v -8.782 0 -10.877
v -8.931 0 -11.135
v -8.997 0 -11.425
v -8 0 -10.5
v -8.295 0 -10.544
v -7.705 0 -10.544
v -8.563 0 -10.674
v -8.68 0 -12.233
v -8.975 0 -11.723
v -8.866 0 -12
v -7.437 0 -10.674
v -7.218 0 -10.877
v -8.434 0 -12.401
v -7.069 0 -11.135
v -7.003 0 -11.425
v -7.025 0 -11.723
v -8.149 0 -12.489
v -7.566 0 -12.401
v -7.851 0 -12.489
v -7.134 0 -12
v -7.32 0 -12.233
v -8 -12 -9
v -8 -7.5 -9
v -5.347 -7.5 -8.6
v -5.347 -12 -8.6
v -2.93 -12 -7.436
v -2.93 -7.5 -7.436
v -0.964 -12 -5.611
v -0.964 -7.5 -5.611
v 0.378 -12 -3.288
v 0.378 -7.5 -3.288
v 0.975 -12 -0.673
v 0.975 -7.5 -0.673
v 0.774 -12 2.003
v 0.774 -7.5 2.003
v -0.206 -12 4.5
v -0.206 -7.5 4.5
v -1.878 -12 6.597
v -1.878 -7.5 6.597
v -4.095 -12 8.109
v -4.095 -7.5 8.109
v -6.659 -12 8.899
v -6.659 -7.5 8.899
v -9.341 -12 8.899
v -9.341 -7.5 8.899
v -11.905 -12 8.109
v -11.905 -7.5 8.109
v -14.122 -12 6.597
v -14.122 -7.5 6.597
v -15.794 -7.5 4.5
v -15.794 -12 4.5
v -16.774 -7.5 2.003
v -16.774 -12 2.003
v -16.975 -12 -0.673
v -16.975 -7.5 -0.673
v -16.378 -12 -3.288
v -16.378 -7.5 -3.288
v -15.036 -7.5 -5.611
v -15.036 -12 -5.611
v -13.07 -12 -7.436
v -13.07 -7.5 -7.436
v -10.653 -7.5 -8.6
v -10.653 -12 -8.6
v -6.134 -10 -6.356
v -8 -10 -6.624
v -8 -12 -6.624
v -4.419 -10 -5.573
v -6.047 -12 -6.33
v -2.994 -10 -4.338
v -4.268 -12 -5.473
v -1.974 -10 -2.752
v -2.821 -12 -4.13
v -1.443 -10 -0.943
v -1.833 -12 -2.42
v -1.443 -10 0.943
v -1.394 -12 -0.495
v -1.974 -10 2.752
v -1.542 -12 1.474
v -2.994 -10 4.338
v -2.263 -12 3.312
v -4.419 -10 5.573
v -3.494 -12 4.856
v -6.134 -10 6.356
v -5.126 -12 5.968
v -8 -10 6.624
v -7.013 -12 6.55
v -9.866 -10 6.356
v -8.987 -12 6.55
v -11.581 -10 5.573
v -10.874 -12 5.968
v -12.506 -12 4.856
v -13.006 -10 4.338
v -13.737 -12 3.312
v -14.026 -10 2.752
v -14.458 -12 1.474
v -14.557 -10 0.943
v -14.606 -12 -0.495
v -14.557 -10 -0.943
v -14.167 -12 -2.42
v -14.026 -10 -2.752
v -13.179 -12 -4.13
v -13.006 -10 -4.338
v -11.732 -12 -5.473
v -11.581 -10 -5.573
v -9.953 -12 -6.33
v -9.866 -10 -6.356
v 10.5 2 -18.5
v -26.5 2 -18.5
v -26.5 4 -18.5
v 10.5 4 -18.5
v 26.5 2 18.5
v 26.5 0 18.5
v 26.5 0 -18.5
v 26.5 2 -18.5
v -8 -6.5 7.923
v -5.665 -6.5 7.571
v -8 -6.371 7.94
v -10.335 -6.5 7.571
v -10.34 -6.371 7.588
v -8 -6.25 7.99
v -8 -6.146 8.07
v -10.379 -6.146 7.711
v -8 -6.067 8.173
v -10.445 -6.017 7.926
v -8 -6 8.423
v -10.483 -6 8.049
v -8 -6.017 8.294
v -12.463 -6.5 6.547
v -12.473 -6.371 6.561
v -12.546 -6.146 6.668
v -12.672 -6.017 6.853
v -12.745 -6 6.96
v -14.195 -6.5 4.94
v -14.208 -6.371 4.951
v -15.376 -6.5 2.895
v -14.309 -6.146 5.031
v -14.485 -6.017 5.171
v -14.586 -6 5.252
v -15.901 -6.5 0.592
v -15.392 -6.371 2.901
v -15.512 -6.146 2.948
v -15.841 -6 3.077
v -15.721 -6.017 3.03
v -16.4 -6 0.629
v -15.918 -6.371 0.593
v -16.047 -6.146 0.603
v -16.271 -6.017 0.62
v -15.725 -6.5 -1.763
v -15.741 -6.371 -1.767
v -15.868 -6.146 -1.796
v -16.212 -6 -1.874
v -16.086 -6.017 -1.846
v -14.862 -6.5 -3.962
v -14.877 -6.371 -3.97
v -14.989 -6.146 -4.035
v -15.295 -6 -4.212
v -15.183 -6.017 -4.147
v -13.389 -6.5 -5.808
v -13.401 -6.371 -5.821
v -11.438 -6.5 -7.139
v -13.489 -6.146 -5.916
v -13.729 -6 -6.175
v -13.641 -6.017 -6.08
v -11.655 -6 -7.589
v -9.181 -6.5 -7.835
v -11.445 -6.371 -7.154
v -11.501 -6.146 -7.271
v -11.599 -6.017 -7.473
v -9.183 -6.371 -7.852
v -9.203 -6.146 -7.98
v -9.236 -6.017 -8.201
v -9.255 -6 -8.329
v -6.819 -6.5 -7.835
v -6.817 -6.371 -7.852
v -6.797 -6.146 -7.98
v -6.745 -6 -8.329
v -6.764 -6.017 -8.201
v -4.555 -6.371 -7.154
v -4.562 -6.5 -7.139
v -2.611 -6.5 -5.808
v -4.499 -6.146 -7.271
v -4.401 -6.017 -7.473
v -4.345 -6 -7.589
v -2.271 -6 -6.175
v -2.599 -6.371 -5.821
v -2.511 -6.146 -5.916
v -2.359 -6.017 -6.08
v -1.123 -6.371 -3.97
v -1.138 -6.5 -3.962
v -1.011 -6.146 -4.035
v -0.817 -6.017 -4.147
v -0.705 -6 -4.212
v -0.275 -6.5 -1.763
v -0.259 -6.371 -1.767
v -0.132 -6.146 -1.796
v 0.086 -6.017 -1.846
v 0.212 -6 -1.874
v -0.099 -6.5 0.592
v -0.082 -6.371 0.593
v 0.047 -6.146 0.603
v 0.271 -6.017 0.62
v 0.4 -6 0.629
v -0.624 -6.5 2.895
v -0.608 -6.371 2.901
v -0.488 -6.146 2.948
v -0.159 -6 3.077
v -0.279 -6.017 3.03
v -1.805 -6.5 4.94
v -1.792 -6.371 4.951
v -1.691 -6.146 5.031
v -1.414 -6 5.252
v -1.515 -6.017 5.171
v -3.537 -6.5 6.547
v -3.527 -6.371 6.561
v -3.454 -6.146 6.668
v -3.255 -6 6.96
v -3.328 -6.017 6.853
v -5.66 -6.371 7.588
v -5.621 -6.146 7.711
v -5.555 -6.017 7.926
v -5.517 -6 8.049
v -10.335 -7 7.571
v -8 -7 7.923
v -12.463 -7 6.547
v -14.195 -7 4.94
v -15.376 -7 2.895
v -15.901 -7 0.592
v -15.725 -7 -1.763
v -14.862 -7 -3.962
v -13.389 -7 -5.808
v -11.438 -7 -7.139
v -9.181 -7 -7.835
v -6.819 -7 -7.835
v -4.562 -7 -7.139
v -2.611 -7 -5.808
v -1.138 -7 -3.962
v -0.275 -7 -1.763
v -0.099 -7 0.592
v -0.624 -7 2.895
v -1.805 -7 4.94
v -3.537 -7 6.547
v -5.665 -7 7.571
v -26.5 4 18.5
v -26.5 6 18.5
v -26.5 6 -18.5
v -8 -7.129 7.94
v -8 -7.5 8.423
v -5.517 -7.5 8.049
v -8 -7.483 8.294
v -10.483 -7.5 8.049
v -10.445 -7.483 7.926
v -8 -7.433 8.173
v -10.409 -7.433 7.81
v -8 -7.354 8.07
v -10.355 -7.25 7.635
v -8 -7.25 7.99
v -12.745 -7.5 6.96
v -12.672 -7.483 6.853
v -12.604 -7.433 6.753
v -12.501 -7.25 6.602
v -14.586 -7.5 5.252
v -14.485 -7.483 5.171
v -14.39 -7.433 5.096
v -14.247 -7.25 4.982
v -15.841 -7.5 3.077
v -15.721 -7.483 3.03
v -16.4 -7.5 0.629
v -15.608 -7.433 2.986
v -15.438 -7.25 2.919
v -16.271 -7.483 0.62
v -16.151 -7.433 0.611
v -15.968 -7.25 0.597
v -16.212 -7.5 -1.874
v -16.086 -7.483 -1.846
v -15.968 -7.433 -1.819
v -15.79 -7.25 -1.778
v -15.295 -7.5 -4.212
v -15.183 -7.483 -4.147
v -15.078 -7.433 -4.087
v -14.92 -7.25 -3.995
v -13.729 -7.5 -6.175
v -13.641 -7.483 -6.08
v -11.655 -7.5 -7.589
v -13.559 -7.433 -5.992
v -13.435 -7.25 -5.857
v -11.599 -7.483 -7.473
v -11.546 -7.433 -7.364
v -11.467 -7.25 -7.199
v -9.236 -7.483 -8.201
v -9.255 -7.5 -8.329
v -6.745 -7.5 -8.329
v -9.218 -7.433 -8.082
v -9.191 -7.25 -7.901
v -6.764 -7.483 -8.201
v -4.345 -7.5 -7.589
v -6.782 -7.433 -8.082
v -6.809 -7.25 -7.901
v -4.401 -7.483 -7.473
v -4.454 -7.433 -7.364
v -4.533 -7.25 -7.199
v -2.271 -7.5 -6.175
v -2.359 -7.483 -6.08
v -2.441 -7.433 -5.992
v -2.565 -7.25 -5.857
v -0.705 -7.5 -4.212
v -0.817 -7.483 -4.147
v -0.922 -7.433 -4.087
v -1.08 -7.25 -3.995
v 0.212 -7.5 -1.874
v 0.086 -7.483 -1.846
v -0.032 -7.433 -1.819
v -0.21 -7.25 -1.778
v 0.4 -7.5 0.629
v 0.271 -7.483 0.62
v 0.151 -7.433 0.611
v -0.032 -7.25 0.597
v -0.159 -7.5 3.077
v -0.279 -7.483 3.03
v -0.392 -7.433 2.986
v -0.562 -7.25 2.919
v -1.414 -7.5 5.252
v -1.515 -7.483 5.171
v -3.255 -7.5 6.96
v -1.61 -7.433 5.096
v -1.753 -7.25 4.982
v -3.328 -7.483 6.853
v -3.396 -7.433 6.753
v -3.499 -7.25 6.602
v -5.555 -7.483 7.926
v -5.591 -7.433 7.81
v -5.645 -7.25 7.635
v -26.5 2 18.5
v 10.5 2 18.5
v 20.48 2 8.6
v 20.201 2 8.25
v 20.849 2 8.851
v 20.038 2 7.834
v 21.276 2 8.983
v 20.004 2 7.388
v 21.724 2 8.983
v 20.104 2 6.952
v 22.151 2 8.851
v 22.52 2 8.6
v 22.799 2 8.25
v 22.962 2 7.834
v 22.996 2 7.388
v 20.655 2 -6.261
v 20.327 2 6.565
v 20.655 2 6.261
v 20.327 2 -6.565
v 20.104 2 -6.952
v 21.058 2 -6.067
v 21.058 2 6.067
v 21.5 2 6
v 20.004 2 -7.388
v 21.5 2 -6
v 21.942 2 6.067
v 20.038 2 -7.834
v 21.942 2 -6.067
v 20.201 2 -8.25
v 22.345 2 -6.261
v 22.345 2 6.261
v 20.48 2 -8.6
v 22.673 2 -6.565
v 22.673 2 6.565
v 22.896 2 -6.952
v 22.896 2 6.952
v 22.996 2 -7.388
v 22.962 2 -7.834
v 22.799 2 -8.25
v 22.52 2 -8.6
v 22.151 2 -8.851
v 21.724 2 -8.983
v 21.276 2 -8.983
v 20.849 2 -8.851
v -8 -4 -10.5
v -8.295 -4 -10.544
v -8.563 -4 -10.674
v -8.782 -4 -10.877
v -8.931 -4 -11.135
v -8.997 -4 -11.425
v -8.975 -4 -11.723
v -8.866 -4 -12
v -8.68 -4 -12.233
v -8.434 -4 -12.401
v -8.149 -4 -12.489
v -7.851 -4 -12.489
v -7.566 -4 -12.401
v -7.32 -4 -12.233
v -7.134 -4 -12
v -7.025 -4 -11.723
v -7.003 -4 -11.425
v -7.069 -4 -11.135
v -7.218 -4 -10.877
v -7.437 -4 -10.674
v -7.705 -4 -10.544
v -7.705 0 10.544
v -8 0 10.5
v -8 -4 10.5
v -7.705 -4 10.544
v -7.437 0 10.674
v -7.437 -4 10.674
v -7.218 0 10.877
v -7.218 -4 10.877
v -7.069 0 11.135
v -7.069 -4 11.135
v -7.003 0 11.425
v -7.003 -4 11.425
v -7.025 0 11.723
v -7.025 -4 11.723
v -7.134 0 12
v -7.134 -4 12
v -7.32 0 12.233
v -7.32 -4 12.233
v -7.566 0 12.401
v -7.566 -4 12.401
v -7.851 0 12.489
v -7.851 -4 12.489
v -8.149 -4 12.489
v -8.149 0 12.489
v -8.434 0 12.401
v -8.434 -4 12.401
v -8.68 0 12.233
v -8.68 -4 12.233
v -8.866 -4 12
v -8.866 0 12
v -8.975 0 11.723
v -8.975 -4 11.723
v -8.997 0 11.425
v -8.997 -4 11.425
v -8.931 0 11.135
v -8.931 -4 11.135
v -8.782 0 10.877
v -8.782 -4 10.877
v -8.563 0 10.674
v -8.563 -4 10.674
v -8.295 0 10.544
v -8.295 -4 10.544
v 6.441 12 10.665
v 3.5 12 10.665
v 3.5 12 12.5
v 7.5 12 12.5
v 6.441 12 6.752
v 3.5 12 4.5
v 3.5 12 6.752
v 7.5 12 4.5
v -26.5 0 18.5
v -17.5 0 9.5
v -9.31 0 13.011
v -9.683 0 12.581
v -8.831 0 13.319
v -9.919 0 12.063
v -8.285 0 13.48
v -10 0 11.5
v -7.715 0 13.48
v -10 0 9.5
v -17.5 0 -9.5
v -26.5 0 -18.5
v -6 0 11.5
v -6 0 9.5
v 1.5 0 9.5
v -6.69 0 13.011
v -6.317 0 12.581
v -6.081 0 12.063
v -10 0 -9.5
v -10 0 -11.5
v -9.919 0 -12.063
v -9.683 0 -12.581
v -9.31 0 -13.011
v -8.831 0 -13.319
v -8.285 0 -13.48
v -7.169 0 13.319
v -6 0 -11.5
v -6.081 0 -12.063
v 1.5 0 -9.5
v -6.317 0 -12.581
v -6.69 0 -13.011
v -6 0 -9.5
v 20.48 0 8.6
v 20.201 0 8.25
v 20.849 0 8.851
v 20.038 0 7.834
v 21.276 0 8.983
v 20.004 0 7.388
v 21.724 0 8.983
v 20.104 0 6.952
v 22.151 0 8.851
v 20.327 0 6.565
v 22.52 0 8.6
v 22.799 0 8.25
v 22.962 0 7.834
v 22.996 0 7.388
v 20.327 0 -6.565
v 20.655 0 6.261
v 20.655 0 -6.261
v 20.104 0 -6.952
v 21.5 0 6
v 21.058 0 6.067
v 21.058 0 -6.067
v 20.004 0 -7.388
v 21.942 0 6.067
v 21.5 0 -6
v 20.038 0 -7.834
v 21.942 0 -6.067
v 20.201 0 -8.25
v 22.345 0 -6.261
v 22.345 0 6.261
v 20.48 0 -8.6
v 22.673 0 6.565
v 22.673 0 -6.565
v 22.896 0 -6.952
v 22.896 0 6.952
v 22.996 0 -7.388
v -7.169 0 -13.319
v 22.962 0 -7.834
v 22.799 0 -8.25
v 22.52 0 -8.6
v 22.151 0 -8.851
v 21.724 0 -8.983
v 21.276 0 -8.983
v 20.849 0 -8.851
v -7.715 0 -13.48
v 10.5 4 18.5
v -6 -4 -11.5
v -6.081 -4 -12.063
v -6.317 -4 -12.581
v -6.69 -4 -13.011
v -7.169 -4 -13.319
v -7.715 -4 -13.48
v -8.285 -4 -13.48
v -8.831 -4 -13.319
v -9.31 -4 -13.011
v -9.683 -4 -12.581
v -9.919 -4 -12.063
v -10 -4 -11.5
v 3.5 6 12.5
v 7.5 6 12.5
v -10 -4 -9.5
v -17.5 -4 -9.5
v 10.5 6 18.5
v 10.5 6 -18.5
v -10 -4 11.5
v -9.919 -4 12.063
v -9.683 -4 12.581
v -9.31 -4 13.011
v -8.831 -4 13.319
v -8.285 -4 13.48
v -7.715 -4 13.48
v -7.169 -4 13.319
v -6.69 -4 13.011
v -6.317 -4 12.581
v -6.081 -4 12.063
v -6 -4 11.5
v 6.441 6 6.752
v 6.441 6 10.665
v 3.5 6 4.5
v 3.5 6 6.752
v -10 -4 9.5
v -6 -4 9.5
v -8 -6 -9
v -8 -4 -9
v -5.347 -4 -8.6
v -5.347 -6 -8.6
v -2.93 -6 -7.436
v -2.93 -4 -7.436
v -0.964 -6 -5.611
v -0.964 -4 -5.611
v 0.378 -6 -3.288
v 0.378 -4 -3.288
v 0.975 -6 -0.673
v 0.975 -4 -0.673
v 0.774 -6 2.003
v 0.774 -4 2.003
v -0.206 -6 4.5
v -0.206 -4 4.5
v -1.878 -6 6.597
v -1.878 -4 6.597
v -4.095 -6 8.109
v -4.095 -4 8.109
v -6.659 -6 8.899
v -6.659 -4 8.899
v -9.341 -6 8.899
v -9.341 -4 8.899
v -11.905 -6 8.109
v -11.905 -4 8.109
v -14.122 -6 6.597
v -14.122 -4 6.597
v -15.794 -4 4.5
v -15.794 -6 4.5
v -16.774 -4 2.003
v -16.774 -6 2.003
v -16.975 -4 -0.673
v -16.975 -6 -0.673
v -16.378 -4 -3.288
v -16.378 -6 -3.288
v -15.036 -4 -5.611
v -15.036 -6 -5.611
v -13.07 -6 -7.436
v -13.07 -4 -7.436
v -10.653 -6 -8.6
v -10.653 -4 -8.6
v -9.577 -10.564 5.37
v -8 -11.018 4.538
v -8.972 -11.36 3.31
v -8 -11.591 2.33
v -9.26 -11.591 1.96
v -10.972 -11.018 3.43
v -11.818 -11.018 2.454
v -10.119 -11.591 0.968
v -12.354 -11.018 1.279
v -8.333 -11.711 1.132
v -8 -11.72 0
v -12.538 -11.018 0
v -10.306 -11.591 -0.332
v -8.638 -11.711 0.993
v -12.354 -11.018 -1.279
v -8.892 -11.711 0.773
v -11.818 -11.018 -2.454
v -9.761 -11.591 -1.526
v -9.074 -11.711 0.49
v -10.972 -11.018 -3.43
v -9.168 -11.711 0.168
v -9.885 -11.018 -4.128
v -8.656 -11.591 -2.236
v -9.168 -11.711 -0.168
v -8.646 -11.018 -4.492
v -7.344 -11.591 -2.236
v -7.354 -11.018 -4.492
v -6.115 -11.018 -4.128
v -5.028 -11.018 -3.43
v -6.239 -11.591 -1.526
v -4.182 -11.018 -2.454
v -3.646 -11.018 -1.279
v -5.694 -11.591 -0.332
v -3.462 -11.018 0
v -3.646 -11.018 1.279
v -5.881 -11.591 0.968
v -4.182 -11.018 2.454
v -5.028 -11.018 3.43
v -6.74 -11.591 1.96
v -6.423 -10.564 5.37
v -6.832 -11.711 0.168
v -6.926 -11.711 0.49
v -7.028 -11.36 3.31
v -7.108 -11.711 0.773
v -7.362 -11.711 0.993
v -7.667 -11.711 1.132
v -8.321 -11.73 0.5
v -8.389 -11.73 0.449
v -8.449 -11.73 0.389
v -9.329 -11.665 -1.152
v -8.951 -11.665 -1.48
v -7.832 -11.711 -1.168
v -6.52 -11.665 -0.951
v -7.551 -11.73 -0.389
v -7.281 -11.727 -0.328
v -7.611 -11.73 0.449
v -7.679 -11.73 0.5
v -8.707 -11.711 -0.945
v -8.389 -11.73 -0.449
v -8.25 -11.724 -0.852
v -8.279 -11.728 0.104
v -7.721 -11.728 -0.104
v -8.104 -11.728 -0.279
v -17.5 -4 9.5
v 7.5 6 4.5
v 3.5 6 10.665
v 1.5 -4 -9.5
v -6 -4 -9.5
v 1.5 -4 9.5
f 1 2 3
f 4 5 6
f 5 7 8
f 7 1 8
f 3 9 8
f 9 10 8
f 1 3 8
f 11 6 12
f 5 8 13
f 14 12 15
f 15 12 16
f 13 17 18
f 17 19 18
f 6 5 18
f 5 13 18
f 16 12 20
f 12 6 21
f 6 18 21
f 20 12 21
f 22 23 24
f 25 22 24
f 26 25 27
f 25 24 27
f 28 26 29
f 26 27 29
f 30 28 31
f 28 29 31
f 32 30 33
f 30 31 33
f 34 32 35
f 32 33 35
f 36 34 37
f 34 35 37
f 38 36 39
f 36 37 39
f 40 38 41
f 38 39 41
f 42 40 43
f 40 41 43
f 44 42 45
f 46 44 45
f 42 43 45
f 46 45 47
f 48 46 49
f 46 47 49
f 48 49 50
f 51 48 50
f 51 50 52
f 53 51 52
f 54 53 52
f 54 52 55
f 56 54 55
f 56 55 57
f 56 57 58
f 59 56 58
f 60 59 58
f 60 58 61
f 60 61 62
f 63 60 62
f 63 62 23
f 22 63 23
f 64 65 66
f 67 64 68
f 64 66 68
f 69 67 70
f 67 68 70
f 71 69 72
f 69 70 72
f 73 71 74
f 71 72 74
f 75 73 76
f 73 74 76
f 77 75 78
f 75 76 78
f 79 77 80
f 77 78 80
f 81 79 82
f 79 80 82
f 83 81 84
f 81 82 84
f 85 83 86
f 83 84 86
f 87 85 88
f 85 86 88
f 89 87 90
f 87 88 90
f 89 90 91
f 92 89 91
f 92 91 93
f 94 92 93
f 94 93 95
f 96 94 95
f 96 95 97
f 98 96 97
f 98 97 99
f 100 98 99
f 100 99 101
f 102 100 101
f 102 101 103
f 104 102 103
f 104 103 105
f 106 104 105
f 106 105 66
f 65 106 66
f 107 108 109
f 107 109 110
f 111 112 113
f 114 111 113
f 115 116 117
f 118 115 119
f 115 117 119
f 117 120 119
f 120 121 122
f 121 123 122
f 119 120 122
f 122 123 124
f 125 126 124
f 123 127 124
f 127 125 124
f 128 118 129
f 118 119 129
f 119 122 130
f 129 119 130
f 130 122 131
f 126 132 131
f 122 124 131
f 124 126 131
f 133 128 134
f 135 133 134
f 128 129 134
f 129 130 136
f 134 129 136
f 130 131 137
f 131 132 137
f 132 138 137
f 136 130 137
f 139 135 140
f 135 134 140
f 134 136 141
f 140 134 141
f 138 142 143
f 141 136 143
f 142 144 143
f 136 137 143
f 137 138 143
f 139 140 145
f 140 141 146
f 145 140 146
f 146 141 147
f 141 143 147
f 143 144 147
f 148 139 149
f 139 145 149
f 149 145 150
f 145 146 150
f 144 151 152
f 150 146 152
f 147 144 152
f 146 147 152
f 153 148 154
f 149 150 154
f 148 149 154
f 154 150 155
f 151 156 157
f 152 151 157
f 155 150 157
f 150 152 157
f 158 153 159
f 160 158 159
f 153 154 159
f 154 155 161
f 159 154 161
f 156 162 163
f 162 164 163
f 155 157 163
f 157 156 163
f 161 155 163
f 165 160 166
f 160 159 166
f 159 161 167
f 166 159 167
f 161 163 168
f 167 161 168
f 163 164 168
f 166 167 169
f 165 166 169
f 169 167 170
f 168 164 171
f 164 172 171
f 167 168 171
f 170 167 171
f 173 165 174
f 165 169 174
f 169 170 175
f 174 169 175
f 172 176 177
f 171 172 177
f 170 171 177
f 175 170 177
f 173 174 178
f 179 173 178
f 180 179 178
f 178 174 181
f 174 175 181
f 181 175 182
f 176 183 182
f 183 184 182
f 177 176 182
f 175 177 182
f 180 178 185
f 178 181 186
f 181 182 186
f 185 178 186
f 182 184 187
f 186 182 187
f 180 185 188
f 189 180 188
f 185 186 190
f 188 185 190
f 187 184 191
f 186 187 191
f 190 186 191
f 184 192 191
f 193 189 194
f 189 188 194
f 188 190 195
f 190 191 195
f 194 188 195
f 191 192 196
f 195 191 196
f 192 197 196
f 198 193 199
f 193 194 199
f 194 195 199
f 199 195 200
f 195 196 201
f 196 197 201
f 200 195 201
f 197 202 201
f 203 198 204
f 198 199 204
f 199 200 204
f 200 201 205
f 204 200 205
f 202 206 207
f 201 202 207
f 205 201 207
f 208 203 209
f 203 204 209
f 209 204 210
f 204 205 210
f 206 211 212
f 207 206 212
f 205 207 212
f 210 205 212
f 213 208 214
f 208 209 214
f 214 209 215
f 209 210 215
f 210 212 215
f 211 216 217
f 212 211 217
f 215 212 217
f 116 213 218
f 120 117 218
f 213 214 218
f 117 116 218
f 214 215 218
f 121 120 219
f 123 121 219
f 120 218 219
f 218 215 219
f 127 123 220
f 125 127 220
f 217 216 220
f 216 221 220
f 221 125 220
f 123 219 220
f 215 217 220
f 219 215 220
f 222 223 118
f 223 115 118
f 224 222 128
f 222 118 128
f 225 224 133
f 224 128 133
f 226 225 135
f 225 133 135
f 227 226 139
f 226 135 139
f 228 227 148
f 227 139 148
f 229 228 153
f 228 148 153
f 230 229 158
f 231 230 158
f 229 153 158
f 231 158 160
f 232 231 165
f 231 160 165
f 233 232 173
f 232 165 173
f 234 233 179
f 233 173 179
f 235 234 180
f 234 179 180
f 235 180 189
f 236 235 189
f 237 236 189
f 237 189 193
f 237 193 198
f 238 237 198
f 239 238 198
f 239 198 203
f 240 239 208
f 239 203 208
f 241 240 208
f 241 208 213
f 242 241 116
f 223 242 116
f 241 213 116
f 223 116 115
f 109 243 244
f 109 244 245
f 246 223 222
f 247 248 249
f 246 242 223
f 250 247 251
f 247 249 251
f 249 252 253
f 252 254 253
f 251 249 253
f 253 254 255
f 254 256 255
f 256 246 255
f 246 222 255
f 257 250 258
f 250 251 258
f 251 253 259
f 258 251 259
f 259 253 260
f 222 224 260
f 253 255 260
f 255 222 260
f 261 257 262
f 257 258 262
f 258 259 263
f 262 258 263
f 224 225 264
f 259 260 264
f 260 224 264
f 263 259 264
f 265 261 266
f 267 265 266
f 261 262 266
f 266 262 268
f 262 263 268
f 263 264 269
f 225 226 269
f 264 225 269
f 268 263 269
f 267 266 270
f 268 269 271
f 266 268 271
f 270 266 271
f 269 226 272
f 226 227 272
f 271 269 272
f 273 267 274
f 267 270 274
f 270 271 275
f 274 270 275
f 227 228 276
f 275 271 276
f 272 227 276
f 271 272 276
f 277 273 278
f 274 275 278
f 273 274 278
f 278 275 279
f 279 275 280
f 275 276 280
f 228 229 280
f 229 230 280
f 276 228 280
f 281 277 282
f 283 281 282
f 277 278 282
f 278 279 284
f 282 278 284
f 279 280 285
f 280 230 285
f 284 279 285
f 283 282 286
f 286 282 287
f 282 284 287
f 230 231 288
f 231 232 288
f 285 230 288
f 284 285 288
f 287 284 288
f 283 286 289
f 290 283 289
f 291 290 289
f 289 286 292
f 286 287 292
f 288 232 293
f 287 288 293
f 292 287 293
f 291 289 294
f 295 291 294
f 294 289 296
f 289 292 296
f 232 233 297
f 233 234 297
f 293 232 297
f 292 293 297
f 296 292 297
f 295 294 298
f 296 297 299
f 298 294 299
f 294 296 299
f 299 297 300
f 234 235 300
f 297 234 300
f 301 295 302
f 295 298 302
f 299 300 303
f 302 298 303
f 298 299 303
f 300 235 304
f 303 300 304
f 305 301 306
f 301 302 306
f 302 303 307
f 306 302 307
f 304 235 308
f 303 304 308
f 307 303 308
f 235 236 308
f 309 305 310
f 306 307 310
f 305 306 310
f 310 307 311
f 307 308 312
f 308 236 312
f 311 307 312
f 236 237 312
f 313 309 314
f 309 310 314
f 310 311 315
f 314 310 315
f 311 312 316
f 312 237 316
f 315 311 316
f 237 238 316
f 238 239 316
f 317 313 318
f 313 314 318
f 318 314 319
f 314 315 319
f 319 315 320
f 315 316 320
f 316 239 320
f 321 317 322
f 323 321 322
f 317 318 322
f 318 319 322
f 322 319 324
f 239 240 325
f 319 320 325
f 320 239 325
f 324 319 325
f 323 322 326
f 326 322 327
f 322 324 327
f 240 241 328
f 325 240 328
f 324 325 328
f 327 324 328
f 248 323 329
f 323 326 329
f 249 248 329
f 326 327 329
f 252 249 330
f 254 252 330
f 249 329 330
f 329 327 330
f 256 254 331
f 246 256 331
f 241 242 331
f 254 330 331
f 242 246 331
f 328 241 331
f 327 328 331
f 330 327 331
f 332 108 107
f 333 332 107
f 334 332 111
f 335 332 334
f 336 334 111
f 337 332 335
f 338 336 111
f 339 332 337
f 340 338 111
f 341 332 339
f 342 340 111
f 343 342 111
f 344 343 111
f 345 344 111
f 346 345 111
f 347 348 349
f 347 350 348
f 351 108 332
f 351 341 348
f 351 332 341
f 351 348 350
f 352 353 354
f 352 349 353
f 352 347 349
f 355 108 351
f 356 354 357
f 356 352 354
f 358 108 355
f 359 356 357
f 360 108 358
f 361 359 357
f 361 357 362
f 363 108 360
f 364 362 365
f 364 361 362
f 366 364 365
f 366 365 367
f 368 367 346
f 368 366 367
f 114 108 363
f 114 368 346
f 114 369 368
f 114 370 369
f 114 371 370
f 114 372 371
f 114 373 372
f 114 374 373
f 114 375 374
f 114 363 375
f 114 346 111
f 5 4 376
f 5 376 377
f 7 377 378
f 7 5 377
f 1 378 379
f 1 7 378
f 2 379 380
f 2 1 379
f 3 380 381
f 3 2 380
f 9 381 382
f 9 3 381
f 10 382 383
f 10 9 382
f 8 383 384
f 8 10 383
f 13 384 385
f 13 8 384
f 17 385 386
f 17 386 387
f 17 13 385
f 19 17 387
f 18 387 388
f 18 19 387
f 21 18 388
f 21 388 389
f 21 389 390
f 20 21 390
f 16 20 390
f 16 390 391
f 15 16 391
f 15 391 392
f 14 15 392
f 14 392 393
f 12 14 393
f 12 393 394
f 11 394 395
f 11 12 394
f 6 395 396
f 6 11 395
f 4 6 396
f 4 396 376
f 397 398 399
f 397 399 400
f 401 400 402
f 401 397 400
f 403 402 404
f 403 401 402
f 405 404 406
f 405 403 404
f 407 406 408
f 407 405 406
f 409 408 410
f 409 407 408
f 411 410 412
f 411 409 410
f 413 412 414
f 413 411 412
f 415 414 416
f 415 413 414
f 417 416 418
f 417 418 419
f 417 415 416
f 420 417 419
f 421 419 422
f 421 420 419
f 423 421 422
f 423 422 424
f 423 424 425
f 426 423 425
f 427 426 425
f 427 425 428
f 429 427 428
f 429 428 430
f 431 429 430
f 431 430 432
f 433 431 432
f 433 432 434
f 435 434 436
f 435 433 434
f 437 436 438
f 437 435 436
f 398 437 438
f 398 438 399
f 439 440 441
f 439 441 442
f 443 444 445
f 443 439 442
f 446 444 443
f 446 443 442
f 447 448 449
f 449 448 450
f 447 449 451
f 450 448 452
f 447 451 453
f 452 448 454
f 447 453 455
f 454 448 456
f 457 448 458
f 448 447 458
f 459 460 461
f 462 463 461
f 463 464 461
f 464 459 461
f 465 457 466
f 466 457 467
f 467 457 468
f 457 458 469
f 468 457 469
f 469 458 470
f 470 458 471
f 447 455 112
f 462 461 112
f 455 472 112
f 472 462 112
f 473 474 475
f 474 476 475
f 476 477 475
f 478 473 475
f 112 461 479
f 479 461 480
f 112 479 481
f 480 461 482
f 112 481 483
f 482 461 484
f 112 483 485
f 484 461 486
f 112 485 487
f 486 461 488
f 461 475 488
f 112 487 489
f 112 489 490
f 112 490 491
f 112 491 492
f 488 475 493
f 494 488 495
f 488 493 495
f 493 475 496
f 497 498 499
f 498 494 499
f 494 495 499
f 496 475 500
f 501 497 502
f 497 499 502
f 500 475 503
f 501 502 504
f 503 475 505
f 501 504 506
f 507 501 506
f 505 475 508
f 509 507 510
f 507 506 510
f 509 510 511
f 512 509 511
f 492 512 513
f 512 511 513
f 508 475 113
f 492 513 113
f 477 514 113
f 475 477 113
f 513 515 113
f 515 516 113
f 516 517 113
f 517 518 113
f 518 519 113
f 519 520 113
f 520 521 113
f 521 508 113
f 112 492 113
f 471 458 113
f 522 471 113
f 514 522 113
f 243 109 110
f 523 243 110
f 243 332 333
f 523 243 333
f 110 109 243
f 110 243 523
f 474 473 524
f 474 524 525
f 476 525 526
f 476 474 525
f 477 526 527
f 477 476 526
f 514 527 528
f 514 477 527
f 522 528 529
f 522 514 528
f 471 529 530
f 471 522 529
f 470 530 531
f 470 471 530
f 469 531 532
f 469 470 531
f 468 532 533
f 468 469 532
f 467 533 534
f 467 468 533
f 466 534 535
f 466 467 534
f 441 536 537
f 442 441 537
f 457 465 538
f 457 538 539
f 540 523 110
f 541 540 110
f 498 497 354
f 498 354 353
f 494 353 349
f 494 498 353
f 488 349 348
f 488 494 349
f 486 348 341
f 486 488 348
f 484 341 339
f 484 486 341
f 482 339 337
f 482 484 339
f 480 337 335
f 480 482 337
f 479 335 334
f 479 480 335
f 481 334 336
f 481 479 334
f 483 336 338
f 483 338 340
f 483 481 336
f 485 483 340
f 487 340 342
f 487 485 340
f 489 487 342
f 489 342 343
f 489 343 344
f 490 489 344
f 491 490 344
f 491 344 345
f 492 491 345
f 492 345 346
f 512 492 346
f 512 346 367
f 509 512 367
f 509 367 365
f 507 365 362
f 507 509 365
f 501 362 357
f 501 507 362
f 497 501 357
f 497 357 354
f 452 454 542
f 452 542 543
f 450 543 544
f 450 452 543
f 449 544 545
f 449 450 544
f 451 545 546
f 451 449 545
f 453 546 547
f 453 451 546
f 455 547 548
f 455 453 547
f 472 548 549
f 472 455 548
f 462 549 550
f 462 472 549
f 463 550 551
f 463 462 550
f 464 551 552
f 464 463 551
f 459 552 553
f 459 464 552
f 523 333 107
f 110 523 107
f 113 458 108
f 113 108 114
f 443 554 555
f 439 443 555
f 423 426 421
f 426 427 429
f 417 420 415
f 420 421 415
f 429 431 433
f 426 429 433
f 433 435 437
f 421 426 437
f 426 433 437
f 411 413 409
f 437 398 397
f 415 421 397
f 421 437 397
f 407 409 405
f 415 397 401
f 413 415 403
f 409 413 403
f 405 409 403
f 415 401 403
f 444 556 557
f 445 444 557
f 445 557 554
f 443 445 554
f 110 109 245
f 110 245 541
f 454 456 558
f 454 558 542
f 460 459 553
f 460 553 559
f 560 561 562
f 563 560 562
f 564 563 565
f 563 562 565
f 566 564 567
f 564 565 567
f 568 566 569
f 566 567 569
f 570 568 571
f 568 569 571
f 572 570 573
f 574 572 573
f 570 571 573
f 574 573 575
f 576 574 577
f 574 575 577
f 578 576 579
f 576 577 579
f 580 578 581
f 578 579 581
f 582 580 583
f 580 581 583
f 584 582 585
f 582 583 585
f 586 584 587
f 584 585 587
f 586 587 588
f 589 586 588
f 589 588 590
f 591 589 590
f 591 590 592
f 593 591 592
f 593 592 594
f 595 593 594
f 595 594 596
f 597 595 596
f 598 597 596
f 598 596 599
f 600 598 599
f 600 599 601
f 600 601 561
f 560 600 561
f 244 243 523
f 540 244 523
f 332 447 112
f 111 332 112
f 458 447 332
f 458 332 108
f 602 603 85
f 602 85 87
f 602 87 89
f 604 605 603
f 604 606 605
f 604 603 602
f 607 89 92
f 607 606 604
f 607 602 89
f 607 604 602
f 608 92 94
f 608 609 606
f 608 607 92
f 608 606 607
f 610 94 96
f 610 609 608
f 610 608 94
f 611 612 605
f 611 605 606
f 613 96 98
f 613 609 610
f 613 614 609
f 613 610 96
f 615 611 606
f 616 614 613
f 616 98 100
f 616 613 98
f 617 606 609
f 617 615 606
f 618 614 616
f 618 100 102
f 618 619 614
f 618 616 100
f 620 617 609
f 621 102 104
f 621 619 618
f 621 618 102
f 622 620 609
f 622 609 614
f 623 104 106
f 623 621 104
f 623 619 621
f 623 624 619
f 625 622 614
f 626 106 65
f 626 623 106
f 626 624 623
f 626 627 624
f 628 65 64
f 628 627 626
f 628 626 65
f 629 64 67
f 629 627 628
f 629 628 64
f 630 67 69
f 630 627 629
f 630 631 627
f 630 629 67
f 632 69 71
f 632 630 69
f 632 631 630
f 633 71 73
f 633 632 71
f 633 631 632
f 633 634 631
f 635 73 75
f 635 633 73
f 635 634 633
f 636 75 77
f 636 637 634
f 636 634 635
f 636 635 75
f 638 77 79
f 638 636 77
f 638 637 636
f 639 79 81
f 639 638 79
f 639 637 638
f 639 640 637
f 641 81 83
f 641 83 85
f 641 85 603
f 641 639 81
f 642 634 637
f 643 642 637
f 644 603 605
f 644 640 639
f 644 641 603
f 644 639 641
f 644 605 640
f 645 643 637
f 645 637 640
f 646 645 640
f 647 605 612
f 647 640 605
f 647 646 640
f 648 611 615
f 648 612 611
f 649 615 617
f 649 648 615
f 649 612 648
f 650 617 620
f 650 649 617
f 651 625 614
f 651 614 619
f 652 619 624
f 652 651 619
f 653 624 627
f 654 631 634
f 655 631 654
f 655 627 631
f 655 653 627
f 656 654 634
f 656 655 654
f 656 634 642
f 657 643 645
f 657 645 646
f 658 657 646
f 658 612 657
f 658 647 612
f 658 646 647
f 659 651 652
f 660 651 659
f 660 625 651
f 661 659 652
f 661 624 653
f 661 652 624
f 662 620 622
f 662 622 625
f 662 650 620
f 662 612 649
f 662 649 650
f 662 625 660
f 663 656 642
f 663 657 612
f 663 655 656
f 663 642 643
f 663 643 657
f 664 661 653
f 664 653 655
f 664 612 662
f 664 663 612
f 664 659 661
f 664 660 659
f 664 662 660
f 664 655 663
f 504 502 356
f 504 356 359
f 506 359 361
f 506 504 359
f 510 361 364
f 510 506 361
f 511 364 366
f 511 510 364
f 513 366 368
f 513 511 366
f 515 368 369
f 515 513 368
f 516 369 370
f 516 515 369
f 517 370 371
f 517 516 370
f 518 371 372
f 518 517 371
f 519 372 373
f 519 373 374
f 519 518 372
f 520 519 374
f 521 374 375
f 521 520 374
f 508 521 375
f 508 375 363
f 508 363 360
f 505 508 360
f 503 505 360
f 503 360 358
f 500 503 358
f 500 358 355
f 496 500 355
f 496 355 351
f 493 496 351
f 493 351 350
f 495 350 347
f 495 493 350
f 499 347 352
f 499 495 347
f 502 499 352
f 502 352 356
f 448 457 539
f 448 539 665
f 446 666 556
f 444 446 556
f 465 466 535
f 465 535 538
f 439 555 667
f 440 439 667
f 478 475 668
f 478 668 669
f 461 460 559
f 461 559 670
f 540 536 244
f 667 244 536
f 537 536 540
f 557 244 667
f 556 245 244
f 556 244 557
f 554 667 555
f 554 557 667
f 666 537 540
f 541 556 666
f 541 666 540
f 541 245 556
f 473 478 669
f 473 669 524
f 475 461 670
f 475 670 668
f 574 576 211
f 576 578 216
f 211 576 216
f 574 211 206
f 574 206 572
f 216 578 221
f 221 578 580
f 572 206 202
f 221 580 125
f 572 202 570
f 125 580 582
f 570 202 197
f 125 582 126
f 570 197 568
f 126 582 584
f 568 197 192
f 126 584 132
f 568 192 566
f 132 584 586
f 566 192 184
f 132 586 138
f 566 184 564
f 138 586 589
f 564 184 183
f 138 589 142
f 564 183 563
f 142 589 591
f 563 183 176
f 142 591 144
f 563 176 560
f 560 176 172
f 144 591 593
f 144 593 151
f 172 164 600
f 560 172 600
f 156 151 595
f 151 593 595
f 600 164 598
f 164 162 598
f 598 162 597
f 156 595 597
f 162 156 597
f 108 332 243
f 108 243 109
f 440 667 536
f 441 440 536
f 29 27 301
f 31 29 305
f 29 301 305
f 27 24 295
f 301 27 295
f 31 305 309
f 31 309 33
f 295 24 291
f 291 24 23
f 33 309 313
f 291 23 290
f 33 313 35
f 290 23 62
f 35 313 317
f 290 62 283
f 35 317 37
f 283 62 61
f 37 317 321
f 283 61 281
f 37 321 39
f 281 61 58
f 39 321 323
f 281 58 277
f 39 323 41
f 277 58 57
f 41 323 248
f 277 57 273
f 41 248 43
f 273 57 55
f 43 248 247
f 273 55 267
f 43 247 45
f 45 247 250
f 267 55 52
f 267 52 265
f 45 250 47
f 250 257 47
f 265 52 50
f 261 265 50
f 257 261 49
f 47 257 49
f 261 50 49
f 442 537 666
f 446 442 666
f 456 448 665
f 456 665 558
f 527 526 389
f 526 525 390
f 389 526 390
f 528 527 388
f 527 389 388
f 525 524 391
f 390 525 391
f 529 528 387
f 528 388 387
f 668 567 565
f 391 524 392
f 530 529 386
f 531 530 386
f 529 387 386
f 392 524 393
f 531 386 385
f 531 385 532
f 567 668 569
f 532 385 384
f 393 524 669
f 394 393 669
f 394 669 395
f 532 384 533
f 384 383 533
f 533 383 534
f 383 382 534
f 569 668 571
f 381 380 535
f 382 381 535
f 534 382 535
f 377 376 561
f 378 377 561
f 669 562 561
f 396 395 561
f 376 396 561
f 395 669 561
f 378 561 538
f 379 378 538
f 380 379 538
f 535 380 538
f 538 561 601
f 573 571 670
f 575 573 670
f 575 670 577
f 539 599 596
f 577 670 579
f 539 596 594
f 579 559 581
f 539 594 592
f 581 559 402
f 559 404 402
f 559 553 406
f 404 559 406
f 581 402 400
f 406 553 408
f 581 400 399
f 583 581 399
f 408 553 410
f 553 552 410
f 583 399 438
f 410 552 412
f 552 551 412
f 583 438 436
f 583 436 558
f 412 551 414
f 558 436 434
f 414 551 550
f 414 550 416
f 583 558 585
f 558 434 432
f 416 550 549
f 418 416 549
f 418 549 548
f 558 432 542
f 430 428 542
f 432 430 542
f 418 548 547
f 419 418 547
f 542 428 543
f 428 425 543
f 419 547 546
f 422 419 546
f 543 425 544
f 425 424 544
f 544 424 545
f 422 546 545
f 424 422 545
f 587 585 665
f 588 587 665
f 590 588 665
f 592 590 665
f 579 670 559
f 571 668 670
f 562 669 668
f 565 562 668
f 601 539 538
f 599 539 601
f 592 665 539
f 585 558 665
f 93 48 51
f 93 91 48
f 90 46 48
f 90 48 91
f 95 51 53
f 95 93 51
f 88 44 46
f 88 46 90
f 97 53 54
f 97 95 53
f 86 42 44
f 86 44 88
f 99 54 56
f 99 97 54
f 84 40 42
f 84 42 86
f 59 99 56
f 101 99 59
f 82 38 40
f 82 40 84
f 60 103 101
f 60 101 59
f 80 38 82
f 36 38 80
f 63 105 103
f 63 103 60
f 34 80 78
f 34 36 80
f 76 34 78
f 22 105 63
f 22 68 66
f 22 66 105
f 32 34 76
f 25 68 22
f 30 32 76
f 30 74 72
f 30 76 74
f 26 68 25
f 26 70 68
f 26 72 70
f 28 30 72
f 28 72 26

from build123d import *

# Parameters (mm, degrees)
SKETCH_1_W          = 53
SKETCH_1_H          = 37
SKETCH_1_R          = 1.5
EXTRUDE_1_DEPTH     = 2
SKETCH_2_W          = 37
SKETCH_2_H          = 37
EXTRUDE_2_DEPTH     = 2
SKETCH_3_W          = 37
SKETCH_3_H          = 37
EXTRUDE_3_DEPTH     = 2
EXTRUDE_4_DEPTH     = 6
SKETCH_5_R          = 1
EXTRUDE_5_DEPTH     = 4
SKETCH_6_R          = 9
EXTRUDE_6_DEPTH     = 8
SKETCH_7_R          = 6.62448747
CUT_EXTRUDE_1_DEPTH = 2


with BuildPart() as part:
    # 草图1 → 凸台-拉伸1 (new body)
    with BuildSketch(Plane(origin=(0, 0, 0), x_dir=(1, 0, 0), z_dir=(0, 1, 0))):
        Rectangle(SKETCH_1_W, SKETCH_1_H)
        with Locations((21.5, 7.5)):
            Circle(SKETCH_1_R, mode=Mode.SUBTRACT)
        with Locations((21.5, -7.5)):
            Circle(SKETCH_1_R, mode=Mode.SUBTRACT)
    extrude(amount=EXTRUDE_1_DEPTH)

    # 草图5 → 凸台-拉伸5 (add)
    with BuildSketch(Plane.XZ):
        with BuildLine():
            Line((-6, 11.5), (-6, 9.5))
            Line((-6, 9.5), (1.5, 9.5))
            Line((1.5, 9.5), (1.5, -9.5))
            Line((1.5, -9.5), (-6, -9.5))
            Line((-6, -9.5), (-6, -11.5))
            ThreePointArc((-6, -11.5), (-8, -13.5), (-10, -11.5))
            Line((-10, -11.5), (-10, -9.5))
            Line((-10, -9.5), (-17.5, -9.5))
            Line((-17.5, -9.5), (-17.5, 9.5))
            Line((-17.5, 9.5), (-10, 9.5))
            Line((-10, 9.5), (-10, 11.5))
            ThreePointArc((-10, 11.5), (-8, 13.5), (-6, 11.5))
        make_face()
        with Locations((-8, 11.5)):
            Circle(SKETCH_5_R, mode=Mode.SUBTRACT)
        with Locations((-8, -11.5)):
            Circle(SKETCH_5_R, mode=Mode.SUBTRACT)
    extrude(amount=EXTRUDE_5_DEPTH)

    # 草图6 → 凸台-拉伸6 (add)
    with BuildSketch(Plane.XZ.offset(4)):
        with Locations((-8, 0)):
            Circle(SKETCH_6_R)
    extrude(amount=EXTRUDE_6_DEPTH)

    # 草图7 → 切除-拉伸1 (cut)
    with BuildSketch(Plane.XZ.offset(12)):
        with Locations((-8, 0)):
            Circle(SKETCH_7_R)
    extrude(amount=-CUT_EXTRUDE_1_DEPTH, mode=Mode.SUBTRACT)

    # 草图8 → 旋转1 (revolve)
    with BuildSketch(Plane(origin=(-8, 0, 0), x_dir=(0, -1, 0), z_dir=(1, 0, 0))):
        with BuildLine():
            Line((10, 0), (11.720143423, 0))
            add(Edge.make_bspline(
                [(10, -6.62448747), (11.859849746, -3.586362146), (11.720143423, 0)],
                knots=[0, 0, 0, 1, 1, 1], degree=2))
            Line((10, -6.62448747), (10, 0))
        make_face()
    revolve(axis=Axis((-8, -10, 0), (0, -1, 0)))

    # 草图9 → 切除-旋转1 (revolve, cut)
    with BuildSketch(Plane(origin=(-8, 0, 0), x_dir=(0, -1, 0), z_dir=(1, 0, 0))):
        with BuildLine():
            Line((6, -9), (7.5, -9))
            Line((7.5, -9), (7.5, -8.423402625))
            ThreePointArc((7.5, -8.423402625), (7.353553391, -8.069849234), (7, -7.923402625))
            Line((7, -7.923402625), (6.5, -7.923402625))
            ThreePointArc((6.5, -7.923402625), (6.146446609, -8.069849234), (6, -8.423402625))
            Line((6, -8.423402625), (6, -9))
        make_face()
    revolve(axis=Axis((-8, -6.28732061, 0), (0, -1, 0)), mode=Mode.SUBTRACT)


with BuildPart() as body_2:
    # 草图2 → 凸台-拉伸2 (new body)
    with BuildSketch(Plane(origin=(0, 2, 0), x_dir=(1, 0, 0), z_dir=(0, 1, 0))):
        with Locations((-8, 0)):
            Rectangle(SKETCH_2_W, SKETCH_2_H)
    extrude(amount=EXTRUDE_2_DEPTH)


with BuildPart() as body_3:
    # 草图3 → 凸台-拉伸3 (new body)
    with BuildSketch(Plane(origin=(0, 4, 0), x_dir=(1, 0, 0), z_dir=(0, 1, 0))):
        with Locations((-8, 0)):
            Rectangle(SKETCH_3_W, SKETCH_3_H)
    extrude(amount=EXTRUDE_3_DEPTH)

    # 草图4 → 凸台-拉伸4 (add)
    with BuildSketch(Plane(origin=(0, 6, 0), x_dir=(1, 0, 0), z_dir=(0, 1, 0))):
        Polygon((3.5, -10.664911908), (3.5, -12.5), (7.5, -12.5), (7.5, -4.5), (3.5, -4.5), (3.5, -6.751845124), (6.441233058, -6.751845124), (6.441233058, -10.664911908), align=None)
    extrude(amount=EXTRUDE_4_DEPTH)


solid = Compound([part.part, body_2.part, body_3.part])
